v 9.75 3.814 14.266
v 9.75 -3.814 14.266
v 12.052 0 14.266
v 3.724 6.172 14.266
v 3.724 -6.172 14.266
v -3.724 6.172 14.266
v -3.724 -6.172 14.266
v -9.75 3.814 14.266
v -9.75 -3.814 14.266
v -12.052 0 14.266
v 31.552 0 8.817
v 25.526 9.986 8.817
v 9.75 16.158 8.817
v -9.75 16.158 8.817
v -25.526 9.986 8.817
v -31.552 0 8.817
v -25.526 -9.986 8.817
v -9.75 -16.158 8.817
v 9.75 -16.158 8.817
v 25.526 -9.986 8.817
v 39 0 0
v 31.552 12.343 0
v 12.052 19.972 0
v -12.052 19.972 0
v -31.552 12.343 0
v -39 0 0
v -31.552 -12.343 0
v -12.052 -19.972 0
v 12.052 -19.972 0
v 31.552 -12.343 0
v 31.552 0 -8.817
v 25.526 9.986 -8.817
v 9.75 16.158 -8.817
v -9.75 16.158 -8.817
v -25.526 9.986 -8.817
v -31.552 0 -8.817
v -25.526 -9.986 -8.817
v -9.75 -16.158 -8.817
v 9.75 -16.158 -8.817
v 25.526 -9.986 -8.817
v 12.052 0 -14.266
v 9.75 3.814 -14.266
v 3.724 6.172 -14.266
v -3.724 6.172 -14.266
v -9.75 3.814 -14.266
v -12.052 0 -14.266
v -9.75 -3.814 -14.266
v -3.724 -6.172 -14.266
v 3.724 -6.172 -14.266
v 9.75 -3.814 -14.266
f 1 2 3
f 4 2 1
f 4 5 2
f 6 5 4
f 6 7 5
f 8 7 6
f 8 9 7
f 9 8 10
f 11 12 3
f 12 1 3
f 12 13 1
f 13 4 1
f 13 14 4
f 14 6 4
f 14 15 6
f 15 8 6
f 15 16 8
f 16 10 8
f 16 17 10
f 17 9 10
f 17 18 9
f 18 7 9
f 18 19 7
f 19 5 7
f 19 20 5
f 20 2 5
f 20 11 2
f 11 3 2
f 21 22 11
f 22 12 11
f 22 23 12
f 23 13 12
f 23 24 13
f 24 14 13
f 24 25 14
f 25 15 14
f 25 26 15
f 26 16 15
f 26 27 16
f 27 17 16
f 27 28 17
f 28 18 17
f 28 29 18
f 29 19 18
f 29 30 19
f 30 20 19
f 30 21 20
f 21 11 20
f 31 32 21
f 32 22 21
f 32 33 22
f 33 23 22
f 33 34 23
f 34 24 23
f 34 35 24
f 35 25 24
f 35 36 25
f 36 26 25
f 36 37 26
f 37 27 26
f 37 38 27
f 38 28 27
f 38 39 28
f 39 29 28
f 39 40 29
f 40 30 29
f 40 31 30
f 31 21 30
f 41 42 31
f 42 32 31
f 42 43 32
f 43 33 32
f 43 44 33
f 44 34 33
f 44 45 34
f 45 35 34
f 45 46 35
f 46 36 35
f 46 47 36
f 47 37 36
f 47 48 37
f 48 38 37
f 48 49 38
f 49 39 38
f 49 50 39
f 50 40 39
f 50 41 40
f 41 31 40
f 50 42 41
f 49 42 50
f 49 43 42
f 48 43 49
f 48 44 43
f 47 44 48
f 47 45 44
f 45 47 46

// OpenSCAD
// Generated by SolidPython 1.0.1 on 2020-07-29 00:46:50


scale(v = [13, 7, 5]) {
	sphere(r = 3);
}
/***********************************************
*********      SolidPython code:      **********
************************************************
 
# import packages: SolidPython
from solid import *
from solid.utils import *
from itertools import chain, combinations, permutations


class Resize:

    def __init__(self, scad_file):
        self.scad_file = scad_file
        #self.scad_file = import_scad(scad_file)
        # cone/cylinder param:
        self.r1 = 0
        self.r2 = 0
        self.h = 0
        # rectangular prism param:
        self.w = 0
        self.l = 0
        # ellipse param:
        self.r = 0

    # import OpenScad code (file name corresponds to shape)


    # classify shape + parameters
    def assign(self, param1, param2, param3):
        if self.scad_file == 'cone.scad':
            self.r1 = param1
            self.r2 = param2
            self.h = param3
        elif self.scad_file == 'cylinder.scad':
            self.r1 = param1
            self.r2 = param2
            self.h = param3
        elif self.scad_file == 'rectangularPrism.scad':
            self.h = param1
            self.l = param2
            self.w = param3
        else:
            self.r = param1
            self.h = param2

    # resize parameters
    def iterate(self):
        x = range(3, 20, 2)
        i = 1
        if self.scad_file == 'cone.scad':
            tempList = list(permutations(x, 2))
            for temp in tempList:
                param1 = temp[0]
                param2 = temp[1]
                filepath = 'produced_scad_files/' + 'cone' + str(param1) + '_' + str(param2) + '_' + '.scad'
                scad_render_to_file(cylinder(h=param1, r1=param2, r2=0), filepath)

        elif self.scad_file == 'cylinder.scad':
            tempList = list(permutations(x, 3))
            for temp in tempList:
                param1 = temp[0]
                param2 = temp[1]
                filepath = 'produced_scad_files/' + 'cylinder' + str(param1) + '_' + str(param2) + '_' + '.scad'
                scad_render_to_file(cylinder(h=param1, r1=param2, r2=param2), filepath)

        elif self.scad_file == 'rectangularPrism.scad':
            tempList = list(permutations(x, 3))
            for temp in tempList:
                param1 = temp[0]
                param2 = temp[1]
                param3 = temp[2]
                filepath = 'produced_scad_files/' + 'rectangularPrism' + str(param1) + '_' + str(param2) + '_' + str(
                    param3) + '.scad'
                scad_render_to_file(cube(size=(param1, param2, param3)), filepath)

        elif self.scad_file == 'ellipse.scad':
            tempList = list(permutations(x, 4))
            for temp in tempList:
                param1 = temp[0]
                param2 = temp[1]
                param3 = temp[2]
                param4 = temp[3]
                filepath = 'produced_scad_files/' + 'ellipse' + str(param1) + '_' + str(param2) + '_' + str(param3) + '_' + str(param4) + '.scad'
                scad_render_to_file(scale([param1, param2, param3])(sphere(r=param4)), filepath)

    def render_to_scadfile(self):
        scad_render_to_file(scad, 'example.scad') 
 
************************************************/
